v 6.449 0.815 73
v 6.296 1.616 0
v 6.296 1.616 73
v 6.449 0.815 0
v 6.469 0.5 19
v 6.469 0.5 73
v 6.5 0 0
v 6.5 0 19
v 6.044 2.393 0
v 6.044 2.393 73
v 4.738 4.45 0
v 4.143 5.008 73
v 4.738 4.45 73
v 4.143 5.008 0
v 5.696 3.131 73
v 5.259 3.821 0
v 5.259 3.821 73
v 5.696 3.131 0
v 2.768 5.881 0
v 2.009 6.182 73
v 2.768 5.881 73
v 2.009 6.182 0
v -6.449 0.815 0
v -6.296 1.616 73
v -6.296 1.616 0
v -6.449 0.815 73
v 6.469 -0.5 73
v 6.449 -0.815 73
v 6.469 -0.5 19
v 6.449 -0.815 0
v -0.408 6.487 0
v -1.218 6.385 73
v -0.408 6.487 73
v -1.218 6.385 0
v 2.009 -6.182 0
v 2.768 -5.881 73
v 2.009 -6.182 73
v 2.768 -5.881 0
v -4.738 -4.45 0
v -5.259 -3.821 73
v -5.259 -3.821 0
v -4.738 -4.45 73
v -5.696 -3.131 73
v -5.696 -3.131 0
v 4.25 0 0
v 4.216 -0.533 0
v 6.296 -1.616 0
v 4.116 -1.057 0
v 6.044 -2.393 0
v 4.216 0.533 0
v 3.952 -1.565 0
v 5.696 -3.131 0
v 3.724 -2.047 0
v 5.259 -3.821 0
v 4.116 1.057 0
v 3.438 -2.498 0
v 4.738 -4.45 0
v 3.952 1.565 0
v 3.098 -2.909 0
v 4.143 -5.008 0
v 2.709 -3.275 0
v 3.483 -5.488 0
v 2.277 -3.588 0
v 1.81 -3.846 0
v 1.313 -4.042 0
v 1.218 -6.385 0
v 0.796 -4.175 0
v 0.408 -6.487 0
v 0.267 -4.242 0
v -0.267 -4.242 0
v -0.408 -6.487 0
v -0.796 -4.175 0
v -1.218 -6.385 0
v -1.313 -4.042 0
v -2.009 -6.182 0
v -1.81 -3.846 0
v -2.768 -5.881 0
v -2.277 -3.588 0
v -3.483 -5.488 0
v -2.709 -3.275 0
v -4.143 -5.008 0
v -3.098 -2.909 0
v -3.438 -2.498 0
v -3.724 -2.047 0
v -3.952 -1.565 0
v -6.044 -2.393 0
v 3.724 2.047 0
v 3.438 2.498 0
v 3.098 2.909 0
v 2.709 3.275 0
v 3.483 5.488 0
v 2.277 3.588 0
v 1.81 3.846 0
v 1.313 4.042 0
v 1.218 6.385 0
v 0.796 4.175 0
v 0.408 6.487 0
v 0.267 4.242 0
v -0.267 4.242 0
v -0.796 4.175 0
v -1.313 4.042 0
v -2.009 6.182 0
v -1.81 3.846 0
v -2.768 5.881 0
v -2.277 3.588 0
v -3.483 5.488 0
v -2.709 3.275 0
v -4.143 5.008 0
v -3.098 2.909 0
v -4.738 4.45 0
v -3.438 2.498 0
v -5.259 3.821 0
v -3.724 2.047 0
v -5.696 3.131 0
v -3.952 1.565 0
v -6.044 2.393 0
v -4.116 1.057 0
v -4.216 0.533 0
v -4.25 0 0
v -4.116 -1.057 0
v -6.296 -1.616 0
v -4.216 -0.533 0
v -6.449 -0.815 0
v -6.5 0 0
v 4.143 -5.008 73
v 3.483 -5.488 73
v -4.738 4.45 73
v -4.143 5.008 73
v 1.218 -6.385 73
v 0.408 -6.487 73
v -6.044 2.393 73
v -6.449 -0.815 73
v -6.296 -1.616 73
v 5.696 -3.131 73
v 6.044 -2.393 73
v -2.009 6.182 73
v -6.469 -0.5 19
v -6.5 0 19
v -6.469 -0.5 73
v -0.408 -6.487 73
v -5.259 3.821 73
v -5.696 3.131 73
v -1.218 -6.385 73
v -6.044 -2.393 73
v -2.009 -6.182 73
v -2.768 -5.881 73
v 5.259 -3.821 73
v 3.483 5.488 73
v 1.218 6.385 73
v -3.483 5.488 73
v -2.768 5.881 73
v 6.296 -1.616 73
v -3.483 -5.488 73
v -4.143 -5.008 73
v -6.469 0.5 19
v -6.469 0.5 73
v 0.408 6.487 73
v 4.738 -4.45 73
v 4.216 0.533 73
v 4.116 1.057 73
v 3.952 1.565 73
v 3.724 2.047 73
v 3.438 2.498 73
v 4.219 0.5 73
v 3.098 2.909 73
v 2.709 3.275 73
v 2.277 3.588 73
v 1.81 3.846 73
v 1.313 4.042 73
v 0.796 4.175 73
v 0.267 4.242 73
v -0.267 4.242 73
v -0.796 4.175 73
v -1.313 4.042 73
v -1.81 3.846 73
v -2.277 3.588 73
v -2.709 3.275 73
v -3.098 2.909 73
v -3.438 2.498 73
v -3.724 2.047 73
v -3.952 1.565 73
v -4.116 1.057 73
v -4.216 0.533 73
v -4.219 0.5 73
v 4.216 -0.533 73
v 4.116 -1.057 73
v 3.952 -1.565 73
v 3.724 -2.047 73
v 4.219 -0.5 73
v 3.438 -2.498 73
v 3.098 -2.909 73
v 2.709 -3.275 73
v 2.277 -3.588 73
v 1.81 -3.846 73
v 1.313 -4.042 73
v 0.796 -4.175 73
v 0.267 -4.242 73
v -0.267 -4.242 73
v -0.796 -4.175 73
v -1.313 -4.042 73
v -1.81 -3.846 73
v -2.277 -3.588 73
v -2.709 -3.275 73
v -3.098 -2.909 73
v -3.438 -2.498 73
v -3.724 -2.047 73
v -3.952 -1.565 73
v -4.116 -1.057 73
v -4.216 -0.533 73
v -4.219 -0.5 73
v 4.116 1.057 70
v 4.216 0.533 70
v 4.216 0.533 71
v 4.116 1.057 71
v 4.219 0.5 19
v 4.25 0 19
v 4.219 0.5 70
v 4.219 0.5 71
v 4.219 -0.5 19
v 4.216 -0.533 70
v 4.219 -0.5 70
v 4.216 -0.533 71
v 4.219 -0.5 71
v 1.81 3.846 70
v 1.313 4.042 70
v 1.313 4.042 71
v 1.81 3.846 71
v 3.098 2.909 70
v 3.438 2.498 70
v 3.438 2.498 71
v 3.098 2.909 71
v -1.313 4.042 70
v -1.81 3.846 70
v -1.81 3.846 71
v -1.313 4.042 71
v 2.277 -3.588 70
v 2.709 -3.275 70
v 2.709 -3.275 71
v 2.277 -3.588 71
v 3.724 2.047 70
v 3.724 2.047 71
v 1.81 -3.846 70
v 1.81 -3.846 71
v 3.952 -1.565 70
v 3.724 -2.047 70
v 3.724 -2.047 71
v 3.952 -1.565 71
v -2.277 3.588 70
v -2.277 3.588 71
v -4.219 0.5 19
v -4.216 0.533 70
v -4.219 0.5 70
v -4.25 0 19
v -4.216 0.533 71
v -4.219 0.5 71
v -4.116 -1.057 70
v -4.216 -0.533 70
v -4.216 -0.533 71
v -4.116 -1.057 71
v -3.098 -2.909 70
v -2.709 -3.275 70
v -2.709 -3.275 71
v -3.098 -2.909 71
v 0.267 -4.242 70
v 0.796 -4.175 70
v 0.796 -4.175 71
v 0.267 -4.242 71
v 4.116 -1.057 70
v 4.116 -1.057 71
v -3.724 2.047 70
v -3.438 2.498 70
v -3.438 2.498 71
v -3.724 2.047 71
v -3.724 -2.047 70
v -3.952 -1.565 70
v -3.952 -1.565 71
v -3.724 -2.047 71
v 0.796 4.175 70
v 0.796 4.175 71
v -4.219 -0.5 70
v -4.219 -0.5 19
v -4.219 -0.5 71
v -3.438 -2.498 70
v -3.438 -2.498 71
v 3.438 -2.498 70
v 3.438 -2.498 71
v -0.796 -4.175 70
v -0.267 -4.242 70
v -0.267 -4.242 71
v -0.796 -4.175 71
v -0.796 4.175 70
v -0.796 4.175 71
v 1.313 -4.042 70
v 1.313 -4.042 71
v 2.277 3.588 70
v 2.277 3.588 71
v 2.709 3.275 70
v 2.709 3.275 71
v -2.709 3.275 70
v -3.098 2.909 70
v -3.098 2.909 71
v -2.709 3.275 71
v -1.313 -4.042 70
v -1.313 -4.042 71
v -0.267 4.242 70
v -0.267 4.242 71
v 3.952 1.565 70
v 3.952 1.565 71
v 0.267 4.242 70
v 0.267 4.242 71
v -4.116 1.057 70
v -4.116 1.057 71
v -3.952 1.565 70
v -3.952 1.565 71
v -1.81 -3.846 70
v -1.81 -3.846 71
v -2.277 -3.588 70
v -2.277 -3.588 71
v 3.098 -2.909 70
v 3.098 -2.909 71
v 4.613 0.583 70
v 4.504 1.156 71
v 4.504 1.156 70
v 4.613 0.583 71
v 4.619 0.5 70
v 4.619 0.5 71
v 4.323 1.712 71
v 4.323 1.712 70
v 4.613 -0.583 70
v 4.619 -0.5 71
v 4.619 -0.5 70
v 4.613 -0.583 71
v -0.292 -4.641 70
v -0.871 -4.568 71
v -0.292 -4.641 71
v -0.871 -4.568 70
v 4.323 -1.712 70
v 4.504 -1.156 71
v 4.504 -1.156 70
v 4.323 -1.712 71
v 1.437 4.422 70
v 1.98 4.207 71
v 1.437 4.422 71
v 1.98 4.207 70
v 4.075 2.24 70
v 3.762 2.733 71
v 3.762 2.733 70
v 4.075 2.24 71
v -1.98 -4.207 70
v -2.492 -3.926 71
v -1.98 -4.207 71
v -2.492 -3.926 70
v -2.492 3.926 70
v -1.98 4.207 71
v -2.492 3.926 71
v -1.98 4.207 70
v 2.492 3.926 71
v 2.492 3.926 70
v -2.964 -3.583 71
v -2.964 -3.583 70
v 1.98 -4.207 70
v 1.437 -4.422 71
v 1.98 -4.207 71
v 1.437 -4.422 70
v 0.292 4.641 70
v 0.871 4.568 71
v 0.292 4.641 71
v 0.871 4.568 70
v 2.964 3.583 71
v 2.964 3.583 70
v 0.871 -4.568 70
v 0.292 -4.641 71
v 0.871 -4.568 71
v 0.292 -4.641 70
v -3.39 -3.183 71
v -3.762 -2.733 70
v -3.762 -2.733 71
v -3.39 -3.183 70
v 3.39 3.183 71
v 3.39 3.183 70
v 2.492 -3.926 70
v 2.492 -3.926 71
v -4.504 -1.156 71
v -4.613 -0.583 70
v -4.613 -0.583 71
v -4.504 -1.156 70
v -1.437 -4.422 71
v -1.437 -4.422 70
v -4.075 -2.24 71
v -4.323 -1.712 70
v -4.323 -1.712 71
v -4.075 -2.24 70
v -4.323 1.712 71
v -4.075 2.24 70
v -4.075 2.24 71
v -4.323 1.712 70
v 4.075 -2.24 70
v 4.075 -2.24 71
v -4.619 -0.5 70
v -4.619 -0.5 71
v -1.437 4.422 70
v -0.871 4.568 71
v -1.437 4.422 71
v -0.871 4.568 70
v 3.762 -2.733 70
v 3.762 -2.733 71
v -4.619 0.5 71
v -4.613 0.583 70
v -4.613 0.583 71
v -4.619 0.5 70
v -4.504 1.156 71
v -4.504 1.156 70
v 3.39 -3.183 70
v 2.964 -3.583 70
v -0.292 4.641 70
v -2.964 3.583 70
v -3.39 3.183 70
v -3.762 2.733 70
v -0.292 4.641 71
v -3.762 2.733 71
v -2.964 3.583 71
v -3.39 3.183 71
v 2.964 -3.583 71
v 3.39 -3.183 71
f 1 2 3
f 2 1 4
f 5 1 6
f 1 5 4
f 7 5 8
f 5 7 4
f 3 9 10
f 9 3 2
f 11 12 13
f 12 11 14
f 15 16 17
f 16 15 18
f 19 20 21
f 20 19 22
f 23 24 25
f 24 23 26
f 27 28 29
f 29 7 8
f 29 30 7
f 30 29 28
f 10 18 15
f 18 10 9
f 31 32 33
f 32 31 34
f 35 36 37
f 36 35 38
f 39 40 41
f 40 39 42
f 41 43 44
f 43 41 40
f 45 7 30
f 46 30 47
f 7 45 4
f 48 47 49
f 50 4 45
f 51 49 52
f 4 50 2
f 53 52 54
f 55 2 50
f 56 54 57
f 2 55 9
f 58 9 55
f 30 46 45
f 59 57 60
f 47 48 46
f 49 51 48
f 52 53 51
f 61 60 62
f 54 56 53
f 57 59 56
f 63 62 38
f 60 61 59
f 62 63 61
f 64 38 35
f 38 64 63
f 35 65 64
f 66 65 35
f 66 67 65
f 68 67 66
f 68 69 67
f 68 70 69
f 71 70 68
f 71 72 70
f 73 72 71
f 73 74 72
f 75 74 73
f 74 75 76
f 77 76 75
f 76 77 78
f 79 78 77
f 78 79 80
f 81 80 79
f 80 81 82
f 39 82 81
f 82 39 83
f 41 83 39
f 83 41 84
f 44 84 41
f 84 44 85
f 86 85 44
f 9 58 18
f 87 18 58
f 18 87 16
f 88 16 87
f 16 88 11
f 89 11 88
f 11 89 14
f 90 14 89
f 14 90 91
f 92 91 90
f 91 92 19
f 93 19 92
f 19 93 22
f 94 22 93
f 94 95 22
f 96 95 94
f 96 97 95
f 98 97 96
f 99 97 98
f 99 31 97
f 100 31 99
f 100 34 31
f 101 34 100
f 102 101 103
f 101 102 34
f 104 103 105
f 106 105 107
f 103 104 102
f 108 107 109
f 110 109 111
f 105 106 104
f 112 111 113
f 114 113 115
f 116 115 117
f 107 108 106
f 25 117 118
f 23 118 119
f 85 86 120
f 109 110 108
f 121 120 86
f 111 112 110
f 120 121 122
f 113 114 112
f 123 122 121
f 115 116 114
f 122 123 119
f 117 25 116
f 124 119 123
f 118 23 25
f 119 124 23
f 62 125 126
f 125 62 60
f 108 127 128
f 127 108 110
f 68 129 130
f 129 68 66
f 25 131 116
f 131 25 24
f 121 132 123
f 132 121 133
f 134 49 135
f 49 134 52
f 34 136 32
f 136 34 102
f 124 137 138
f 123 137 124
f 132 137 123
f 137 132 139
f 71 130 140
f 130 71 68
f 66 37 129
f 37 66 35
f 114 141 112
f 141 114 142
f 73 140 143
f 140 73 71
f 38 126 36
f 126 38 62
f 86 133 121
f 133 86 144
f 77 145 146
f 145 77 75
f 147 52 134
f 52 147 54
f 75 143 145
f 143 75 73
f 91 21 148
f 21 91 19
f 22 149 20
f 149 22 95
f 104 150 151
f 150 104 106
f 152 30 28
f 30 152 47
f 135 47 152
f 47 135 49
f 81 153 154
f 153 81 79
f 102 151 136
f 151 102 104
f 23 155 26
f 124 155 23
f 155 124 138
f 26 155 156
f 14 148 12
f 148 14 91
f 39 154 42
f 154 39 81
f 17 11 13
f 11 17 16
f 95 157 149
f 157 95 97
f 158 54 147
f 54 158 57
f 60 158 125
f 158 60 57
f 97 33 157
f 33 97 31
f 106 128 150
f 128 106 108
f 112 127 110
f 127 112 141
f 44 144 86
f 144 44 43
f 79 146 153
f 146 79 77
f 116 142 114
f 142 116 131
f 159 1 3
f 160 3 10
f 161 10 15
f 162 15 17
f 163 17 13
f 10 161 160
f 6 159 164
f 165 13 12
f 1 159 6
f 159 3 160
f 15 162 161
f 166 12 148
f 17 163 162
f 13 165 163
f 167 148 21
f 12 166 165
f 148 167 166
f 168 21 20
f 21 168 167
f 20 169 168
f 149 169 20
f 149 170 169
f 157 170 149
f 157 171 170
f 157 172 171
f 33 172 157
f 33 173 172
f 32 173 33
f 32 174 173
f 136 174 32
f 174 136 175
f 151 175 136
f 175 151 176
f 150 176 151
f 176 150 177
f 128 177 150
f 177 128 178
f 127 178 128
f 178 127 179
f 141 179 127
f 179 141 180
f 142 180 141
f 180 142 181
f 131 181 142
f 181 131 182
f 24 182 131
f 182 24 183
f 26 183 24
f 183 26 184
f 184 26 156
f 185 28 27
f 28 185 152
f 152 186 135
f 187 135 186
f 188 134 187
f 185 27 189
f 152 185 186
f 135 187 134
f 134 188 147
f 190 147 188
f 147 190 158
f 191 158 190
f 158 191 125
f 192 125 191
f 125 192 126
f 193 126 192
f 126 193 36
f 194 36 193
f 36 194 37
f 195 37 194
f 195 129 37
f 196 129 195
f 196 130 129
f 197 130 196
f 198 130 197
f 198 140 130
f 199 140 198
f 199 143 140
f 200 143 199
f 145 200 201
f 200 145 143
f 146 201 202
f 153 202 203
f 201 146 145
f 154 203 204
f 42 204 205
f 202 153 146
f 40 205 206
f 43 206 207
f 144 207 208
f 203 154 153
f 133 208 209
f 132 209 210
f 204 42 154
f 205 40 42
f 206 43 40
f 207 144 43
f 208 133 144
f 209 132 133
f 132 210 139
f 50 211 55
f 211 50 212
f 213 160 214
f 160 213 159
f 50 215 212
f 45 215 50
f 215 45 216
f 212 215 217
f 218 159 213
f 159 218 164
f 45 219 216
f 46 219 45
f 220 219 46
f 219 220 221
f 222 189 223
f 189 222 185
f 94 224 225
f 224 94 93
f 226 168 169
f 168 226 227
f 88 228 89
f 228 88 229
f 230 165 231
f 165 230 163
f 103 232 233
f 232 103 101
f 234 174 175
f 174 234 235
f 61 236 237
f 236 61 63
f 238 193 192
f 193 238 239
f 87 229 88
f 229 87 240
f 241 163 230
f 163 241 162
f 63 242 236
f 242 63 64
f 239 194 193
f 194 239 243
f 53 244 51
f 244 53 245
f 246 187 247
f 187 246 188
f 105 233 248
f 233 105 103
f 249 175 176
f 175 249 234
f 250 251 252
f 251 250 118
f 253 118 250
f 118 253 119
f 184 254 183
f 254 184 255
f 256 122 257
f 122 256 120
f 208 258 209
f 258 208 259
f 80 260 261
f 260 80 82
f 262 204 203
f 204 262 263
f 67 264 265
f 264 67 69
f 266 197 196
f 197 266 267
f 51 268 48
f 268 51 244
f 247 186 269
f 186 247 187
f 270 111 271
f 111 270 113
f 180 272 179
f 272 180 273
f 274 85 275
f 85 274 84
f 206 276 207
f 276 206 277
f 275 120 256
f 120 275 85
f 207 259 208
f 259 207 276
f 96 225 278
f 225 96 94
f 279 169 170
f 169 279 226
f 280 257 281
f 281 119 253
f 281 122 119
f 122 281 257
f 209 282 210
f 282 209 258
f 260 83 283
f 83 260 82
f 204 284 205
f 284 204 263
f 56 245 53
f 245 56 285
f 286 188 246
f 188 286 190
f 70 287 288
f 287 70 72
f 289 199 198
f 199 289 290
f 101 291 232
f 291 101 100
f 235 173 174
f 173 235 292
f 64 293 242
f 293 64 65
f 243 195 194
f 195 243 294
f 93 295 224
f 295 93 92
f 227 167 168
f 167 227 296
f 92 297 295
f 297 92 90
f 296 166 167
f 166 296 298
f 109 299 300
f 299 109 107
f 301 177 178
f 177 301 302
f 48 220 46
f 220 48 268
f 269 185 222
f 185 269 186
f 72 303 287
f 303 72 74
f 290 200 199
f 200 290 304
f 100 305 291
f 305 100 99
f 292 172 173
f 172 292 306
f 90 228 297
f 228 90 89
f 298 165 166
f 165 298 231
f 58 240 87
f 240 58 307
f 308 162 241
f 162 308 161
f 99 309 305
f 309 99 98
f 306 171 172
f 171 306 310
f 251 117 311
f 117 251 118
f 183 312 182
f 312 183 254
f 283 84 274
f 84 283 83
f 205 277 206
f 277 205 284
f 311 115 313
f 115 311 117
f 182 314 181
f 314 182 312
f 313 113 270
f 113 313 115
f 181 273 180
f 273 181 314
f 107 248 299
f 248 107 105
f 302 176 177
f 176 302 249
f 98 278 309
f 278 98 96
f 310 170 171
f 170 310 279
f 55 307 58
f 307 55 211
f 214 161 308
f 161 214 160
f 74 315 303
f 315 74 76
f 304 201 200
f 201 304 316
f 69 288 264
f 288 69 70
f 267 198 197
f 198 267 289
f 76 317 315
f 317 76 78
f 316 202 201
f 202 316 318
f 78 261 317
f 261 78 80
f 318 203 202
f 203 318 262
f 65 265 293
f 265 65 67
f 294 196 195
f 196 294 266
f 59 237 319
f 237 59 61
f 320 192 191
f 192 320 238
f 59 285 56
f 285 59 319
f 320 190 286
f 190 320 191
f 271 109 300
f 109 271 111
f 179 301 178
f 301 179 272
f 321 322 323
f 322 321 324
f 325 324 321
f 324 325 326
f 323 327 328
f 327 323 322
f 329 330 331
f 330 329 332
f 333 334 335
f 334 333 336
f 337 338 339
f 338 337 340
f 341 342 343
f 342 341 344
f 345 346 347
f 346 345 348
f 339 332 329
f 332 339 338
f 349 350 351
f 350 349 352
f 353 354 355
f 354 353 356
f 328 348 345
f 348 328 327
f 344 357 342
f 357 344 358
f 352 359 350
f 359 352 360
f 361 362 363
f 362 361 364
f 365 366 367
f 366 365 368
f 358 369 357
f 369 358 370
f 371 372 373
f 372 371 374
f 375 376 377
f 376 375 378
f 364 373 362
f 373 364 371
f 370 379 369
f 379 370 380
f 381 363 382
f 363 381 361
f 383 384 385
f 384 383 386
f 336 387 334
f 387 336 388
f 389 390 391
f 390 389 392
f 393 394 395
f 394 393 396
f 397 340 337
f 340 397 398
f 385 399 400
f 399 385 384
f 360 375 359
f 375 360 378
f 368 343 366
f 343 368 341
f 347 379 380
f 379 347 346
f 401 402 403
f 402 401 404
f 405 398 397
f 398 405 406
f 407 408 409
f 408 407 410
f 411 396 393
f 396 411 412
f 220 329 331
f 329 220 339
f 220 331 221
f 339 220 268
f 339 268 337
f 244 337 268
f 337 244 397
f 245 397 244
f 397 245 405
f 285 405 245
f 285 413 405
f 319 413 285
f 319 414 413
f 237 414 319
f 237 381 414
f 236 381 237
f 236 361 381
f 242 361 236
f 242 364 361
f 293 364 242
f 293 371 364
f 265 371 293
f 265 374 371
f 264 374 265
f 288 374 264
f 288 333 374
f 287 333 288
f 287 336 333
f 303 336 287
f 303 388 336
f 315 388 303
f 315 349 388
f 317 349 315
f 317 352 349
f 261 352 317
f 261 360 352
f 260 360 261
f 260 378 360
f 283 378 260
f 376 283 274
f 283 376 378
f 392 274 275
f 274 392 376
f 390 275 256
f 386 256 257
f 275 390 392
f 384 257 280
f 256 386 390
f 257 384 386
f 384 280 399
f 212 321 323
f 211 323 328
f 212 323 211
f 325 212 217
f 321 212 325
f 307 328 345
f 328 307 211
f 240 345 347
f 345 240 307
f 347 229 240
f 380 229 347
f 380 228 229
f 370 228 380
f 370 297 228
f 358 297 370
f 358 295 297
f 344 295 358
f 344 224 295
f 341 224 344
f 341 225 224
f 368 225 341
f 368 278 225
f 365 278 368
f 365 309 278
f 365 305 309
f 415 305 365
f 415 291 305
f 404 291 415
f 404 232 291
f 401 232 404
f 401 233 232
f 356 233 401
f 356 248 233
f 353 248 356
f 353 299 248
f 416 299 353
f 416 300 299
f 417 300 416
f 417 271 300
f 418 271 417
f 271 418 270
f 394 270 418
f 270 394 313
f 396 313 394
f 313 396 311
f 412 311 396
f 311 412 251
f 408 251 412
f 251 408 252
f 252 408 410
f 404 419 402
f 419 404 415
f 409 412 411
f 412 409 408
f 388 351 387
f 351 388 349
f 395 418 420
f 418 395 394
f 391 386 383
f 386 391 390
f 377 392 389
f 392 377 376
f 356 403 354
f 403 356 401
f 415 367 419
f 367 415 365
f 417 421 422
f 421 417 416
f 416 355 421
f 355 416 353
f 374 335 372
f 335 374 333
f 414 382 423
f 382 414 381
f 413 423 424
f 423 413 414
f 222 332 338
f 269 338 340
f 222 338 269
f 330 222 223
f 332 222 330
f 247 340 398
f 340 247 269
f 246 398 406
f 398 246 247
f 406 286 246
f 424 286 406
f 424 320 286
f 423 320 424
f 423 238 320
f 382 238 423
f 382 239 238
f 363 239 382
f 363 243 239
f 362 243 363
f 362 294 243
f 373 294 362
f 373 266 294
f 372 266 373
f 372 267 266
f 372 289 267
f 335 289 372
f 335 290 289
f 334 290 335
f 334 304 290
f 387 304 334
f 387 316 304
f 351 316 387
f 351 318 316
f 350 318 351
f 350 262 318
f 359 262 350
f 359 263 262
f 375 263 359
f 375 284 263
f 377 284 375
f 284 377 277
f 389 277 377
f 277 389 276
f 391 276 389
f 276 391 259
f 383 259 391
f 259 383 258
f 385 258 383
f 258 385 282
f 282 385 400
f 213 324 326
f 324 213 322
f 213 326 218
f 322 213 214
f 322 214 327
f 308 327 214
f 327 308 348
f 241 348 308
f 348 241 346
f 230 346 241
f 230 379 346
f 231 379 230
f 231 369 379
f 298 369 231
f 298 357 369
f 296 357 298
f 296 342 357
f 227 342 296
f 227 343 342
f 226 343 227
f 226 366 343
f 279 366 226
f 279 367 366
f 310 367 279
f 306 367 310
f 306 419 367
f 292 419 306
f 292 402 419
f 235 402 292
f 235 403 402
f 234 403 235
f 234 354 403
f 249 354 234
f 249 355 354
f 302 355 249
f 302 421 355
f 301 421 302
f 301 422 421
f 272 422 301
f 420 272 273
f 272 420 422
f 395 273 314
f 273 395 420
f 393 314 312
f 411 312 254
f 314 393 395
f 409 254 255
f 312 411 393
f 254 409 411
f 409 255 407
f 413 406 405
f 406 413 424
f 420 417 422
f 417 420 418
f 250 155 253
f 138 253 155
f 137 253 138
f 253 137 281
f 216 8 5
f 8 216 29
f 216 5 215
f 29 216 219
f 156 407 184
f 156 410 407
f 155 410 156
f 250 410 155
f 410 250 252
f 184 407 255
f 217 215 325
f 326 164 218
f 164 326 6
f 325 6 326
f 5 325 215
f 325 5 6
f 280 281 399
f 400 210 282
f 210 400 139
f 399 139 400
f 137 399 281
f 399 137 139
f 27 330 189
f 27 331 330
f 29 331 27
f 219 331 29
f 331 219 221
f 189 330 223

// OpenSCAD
$fn=50;

senzor_prumer=8.5;
senzor_prumer_s_rantlem=9.3;

vyska_drzaku=73;

pruchodka_prumer=13.0;







MRAKOMER4_HOLDER02A();

module MRAKOMER4_HOLDER02A()
{
difference() {
    
union() { 
    
    translate([0,0,vyska_drzaku/2]) 
 cylinder(h=vyska_drzaku, r=pruchodka_prumer/2, center=true);

}
   translate([0,0,vyska_drzaku/2]) 
cylinder(h=vyska_drzaku+0.1, r=senzor_prumer/2, center=true);
  translate([0,0,vyska_drzaku-1/2-2]) 
cylinder(h=1, r=senzor_prumer_s_rantlem/2, center=true);

translate([0,0,vyska_drzaku/2+20]) 
  cube([pruchodka_prumer+2,1,vyska_drzaku+2],center=true); 
    }
   }
  
   
  
